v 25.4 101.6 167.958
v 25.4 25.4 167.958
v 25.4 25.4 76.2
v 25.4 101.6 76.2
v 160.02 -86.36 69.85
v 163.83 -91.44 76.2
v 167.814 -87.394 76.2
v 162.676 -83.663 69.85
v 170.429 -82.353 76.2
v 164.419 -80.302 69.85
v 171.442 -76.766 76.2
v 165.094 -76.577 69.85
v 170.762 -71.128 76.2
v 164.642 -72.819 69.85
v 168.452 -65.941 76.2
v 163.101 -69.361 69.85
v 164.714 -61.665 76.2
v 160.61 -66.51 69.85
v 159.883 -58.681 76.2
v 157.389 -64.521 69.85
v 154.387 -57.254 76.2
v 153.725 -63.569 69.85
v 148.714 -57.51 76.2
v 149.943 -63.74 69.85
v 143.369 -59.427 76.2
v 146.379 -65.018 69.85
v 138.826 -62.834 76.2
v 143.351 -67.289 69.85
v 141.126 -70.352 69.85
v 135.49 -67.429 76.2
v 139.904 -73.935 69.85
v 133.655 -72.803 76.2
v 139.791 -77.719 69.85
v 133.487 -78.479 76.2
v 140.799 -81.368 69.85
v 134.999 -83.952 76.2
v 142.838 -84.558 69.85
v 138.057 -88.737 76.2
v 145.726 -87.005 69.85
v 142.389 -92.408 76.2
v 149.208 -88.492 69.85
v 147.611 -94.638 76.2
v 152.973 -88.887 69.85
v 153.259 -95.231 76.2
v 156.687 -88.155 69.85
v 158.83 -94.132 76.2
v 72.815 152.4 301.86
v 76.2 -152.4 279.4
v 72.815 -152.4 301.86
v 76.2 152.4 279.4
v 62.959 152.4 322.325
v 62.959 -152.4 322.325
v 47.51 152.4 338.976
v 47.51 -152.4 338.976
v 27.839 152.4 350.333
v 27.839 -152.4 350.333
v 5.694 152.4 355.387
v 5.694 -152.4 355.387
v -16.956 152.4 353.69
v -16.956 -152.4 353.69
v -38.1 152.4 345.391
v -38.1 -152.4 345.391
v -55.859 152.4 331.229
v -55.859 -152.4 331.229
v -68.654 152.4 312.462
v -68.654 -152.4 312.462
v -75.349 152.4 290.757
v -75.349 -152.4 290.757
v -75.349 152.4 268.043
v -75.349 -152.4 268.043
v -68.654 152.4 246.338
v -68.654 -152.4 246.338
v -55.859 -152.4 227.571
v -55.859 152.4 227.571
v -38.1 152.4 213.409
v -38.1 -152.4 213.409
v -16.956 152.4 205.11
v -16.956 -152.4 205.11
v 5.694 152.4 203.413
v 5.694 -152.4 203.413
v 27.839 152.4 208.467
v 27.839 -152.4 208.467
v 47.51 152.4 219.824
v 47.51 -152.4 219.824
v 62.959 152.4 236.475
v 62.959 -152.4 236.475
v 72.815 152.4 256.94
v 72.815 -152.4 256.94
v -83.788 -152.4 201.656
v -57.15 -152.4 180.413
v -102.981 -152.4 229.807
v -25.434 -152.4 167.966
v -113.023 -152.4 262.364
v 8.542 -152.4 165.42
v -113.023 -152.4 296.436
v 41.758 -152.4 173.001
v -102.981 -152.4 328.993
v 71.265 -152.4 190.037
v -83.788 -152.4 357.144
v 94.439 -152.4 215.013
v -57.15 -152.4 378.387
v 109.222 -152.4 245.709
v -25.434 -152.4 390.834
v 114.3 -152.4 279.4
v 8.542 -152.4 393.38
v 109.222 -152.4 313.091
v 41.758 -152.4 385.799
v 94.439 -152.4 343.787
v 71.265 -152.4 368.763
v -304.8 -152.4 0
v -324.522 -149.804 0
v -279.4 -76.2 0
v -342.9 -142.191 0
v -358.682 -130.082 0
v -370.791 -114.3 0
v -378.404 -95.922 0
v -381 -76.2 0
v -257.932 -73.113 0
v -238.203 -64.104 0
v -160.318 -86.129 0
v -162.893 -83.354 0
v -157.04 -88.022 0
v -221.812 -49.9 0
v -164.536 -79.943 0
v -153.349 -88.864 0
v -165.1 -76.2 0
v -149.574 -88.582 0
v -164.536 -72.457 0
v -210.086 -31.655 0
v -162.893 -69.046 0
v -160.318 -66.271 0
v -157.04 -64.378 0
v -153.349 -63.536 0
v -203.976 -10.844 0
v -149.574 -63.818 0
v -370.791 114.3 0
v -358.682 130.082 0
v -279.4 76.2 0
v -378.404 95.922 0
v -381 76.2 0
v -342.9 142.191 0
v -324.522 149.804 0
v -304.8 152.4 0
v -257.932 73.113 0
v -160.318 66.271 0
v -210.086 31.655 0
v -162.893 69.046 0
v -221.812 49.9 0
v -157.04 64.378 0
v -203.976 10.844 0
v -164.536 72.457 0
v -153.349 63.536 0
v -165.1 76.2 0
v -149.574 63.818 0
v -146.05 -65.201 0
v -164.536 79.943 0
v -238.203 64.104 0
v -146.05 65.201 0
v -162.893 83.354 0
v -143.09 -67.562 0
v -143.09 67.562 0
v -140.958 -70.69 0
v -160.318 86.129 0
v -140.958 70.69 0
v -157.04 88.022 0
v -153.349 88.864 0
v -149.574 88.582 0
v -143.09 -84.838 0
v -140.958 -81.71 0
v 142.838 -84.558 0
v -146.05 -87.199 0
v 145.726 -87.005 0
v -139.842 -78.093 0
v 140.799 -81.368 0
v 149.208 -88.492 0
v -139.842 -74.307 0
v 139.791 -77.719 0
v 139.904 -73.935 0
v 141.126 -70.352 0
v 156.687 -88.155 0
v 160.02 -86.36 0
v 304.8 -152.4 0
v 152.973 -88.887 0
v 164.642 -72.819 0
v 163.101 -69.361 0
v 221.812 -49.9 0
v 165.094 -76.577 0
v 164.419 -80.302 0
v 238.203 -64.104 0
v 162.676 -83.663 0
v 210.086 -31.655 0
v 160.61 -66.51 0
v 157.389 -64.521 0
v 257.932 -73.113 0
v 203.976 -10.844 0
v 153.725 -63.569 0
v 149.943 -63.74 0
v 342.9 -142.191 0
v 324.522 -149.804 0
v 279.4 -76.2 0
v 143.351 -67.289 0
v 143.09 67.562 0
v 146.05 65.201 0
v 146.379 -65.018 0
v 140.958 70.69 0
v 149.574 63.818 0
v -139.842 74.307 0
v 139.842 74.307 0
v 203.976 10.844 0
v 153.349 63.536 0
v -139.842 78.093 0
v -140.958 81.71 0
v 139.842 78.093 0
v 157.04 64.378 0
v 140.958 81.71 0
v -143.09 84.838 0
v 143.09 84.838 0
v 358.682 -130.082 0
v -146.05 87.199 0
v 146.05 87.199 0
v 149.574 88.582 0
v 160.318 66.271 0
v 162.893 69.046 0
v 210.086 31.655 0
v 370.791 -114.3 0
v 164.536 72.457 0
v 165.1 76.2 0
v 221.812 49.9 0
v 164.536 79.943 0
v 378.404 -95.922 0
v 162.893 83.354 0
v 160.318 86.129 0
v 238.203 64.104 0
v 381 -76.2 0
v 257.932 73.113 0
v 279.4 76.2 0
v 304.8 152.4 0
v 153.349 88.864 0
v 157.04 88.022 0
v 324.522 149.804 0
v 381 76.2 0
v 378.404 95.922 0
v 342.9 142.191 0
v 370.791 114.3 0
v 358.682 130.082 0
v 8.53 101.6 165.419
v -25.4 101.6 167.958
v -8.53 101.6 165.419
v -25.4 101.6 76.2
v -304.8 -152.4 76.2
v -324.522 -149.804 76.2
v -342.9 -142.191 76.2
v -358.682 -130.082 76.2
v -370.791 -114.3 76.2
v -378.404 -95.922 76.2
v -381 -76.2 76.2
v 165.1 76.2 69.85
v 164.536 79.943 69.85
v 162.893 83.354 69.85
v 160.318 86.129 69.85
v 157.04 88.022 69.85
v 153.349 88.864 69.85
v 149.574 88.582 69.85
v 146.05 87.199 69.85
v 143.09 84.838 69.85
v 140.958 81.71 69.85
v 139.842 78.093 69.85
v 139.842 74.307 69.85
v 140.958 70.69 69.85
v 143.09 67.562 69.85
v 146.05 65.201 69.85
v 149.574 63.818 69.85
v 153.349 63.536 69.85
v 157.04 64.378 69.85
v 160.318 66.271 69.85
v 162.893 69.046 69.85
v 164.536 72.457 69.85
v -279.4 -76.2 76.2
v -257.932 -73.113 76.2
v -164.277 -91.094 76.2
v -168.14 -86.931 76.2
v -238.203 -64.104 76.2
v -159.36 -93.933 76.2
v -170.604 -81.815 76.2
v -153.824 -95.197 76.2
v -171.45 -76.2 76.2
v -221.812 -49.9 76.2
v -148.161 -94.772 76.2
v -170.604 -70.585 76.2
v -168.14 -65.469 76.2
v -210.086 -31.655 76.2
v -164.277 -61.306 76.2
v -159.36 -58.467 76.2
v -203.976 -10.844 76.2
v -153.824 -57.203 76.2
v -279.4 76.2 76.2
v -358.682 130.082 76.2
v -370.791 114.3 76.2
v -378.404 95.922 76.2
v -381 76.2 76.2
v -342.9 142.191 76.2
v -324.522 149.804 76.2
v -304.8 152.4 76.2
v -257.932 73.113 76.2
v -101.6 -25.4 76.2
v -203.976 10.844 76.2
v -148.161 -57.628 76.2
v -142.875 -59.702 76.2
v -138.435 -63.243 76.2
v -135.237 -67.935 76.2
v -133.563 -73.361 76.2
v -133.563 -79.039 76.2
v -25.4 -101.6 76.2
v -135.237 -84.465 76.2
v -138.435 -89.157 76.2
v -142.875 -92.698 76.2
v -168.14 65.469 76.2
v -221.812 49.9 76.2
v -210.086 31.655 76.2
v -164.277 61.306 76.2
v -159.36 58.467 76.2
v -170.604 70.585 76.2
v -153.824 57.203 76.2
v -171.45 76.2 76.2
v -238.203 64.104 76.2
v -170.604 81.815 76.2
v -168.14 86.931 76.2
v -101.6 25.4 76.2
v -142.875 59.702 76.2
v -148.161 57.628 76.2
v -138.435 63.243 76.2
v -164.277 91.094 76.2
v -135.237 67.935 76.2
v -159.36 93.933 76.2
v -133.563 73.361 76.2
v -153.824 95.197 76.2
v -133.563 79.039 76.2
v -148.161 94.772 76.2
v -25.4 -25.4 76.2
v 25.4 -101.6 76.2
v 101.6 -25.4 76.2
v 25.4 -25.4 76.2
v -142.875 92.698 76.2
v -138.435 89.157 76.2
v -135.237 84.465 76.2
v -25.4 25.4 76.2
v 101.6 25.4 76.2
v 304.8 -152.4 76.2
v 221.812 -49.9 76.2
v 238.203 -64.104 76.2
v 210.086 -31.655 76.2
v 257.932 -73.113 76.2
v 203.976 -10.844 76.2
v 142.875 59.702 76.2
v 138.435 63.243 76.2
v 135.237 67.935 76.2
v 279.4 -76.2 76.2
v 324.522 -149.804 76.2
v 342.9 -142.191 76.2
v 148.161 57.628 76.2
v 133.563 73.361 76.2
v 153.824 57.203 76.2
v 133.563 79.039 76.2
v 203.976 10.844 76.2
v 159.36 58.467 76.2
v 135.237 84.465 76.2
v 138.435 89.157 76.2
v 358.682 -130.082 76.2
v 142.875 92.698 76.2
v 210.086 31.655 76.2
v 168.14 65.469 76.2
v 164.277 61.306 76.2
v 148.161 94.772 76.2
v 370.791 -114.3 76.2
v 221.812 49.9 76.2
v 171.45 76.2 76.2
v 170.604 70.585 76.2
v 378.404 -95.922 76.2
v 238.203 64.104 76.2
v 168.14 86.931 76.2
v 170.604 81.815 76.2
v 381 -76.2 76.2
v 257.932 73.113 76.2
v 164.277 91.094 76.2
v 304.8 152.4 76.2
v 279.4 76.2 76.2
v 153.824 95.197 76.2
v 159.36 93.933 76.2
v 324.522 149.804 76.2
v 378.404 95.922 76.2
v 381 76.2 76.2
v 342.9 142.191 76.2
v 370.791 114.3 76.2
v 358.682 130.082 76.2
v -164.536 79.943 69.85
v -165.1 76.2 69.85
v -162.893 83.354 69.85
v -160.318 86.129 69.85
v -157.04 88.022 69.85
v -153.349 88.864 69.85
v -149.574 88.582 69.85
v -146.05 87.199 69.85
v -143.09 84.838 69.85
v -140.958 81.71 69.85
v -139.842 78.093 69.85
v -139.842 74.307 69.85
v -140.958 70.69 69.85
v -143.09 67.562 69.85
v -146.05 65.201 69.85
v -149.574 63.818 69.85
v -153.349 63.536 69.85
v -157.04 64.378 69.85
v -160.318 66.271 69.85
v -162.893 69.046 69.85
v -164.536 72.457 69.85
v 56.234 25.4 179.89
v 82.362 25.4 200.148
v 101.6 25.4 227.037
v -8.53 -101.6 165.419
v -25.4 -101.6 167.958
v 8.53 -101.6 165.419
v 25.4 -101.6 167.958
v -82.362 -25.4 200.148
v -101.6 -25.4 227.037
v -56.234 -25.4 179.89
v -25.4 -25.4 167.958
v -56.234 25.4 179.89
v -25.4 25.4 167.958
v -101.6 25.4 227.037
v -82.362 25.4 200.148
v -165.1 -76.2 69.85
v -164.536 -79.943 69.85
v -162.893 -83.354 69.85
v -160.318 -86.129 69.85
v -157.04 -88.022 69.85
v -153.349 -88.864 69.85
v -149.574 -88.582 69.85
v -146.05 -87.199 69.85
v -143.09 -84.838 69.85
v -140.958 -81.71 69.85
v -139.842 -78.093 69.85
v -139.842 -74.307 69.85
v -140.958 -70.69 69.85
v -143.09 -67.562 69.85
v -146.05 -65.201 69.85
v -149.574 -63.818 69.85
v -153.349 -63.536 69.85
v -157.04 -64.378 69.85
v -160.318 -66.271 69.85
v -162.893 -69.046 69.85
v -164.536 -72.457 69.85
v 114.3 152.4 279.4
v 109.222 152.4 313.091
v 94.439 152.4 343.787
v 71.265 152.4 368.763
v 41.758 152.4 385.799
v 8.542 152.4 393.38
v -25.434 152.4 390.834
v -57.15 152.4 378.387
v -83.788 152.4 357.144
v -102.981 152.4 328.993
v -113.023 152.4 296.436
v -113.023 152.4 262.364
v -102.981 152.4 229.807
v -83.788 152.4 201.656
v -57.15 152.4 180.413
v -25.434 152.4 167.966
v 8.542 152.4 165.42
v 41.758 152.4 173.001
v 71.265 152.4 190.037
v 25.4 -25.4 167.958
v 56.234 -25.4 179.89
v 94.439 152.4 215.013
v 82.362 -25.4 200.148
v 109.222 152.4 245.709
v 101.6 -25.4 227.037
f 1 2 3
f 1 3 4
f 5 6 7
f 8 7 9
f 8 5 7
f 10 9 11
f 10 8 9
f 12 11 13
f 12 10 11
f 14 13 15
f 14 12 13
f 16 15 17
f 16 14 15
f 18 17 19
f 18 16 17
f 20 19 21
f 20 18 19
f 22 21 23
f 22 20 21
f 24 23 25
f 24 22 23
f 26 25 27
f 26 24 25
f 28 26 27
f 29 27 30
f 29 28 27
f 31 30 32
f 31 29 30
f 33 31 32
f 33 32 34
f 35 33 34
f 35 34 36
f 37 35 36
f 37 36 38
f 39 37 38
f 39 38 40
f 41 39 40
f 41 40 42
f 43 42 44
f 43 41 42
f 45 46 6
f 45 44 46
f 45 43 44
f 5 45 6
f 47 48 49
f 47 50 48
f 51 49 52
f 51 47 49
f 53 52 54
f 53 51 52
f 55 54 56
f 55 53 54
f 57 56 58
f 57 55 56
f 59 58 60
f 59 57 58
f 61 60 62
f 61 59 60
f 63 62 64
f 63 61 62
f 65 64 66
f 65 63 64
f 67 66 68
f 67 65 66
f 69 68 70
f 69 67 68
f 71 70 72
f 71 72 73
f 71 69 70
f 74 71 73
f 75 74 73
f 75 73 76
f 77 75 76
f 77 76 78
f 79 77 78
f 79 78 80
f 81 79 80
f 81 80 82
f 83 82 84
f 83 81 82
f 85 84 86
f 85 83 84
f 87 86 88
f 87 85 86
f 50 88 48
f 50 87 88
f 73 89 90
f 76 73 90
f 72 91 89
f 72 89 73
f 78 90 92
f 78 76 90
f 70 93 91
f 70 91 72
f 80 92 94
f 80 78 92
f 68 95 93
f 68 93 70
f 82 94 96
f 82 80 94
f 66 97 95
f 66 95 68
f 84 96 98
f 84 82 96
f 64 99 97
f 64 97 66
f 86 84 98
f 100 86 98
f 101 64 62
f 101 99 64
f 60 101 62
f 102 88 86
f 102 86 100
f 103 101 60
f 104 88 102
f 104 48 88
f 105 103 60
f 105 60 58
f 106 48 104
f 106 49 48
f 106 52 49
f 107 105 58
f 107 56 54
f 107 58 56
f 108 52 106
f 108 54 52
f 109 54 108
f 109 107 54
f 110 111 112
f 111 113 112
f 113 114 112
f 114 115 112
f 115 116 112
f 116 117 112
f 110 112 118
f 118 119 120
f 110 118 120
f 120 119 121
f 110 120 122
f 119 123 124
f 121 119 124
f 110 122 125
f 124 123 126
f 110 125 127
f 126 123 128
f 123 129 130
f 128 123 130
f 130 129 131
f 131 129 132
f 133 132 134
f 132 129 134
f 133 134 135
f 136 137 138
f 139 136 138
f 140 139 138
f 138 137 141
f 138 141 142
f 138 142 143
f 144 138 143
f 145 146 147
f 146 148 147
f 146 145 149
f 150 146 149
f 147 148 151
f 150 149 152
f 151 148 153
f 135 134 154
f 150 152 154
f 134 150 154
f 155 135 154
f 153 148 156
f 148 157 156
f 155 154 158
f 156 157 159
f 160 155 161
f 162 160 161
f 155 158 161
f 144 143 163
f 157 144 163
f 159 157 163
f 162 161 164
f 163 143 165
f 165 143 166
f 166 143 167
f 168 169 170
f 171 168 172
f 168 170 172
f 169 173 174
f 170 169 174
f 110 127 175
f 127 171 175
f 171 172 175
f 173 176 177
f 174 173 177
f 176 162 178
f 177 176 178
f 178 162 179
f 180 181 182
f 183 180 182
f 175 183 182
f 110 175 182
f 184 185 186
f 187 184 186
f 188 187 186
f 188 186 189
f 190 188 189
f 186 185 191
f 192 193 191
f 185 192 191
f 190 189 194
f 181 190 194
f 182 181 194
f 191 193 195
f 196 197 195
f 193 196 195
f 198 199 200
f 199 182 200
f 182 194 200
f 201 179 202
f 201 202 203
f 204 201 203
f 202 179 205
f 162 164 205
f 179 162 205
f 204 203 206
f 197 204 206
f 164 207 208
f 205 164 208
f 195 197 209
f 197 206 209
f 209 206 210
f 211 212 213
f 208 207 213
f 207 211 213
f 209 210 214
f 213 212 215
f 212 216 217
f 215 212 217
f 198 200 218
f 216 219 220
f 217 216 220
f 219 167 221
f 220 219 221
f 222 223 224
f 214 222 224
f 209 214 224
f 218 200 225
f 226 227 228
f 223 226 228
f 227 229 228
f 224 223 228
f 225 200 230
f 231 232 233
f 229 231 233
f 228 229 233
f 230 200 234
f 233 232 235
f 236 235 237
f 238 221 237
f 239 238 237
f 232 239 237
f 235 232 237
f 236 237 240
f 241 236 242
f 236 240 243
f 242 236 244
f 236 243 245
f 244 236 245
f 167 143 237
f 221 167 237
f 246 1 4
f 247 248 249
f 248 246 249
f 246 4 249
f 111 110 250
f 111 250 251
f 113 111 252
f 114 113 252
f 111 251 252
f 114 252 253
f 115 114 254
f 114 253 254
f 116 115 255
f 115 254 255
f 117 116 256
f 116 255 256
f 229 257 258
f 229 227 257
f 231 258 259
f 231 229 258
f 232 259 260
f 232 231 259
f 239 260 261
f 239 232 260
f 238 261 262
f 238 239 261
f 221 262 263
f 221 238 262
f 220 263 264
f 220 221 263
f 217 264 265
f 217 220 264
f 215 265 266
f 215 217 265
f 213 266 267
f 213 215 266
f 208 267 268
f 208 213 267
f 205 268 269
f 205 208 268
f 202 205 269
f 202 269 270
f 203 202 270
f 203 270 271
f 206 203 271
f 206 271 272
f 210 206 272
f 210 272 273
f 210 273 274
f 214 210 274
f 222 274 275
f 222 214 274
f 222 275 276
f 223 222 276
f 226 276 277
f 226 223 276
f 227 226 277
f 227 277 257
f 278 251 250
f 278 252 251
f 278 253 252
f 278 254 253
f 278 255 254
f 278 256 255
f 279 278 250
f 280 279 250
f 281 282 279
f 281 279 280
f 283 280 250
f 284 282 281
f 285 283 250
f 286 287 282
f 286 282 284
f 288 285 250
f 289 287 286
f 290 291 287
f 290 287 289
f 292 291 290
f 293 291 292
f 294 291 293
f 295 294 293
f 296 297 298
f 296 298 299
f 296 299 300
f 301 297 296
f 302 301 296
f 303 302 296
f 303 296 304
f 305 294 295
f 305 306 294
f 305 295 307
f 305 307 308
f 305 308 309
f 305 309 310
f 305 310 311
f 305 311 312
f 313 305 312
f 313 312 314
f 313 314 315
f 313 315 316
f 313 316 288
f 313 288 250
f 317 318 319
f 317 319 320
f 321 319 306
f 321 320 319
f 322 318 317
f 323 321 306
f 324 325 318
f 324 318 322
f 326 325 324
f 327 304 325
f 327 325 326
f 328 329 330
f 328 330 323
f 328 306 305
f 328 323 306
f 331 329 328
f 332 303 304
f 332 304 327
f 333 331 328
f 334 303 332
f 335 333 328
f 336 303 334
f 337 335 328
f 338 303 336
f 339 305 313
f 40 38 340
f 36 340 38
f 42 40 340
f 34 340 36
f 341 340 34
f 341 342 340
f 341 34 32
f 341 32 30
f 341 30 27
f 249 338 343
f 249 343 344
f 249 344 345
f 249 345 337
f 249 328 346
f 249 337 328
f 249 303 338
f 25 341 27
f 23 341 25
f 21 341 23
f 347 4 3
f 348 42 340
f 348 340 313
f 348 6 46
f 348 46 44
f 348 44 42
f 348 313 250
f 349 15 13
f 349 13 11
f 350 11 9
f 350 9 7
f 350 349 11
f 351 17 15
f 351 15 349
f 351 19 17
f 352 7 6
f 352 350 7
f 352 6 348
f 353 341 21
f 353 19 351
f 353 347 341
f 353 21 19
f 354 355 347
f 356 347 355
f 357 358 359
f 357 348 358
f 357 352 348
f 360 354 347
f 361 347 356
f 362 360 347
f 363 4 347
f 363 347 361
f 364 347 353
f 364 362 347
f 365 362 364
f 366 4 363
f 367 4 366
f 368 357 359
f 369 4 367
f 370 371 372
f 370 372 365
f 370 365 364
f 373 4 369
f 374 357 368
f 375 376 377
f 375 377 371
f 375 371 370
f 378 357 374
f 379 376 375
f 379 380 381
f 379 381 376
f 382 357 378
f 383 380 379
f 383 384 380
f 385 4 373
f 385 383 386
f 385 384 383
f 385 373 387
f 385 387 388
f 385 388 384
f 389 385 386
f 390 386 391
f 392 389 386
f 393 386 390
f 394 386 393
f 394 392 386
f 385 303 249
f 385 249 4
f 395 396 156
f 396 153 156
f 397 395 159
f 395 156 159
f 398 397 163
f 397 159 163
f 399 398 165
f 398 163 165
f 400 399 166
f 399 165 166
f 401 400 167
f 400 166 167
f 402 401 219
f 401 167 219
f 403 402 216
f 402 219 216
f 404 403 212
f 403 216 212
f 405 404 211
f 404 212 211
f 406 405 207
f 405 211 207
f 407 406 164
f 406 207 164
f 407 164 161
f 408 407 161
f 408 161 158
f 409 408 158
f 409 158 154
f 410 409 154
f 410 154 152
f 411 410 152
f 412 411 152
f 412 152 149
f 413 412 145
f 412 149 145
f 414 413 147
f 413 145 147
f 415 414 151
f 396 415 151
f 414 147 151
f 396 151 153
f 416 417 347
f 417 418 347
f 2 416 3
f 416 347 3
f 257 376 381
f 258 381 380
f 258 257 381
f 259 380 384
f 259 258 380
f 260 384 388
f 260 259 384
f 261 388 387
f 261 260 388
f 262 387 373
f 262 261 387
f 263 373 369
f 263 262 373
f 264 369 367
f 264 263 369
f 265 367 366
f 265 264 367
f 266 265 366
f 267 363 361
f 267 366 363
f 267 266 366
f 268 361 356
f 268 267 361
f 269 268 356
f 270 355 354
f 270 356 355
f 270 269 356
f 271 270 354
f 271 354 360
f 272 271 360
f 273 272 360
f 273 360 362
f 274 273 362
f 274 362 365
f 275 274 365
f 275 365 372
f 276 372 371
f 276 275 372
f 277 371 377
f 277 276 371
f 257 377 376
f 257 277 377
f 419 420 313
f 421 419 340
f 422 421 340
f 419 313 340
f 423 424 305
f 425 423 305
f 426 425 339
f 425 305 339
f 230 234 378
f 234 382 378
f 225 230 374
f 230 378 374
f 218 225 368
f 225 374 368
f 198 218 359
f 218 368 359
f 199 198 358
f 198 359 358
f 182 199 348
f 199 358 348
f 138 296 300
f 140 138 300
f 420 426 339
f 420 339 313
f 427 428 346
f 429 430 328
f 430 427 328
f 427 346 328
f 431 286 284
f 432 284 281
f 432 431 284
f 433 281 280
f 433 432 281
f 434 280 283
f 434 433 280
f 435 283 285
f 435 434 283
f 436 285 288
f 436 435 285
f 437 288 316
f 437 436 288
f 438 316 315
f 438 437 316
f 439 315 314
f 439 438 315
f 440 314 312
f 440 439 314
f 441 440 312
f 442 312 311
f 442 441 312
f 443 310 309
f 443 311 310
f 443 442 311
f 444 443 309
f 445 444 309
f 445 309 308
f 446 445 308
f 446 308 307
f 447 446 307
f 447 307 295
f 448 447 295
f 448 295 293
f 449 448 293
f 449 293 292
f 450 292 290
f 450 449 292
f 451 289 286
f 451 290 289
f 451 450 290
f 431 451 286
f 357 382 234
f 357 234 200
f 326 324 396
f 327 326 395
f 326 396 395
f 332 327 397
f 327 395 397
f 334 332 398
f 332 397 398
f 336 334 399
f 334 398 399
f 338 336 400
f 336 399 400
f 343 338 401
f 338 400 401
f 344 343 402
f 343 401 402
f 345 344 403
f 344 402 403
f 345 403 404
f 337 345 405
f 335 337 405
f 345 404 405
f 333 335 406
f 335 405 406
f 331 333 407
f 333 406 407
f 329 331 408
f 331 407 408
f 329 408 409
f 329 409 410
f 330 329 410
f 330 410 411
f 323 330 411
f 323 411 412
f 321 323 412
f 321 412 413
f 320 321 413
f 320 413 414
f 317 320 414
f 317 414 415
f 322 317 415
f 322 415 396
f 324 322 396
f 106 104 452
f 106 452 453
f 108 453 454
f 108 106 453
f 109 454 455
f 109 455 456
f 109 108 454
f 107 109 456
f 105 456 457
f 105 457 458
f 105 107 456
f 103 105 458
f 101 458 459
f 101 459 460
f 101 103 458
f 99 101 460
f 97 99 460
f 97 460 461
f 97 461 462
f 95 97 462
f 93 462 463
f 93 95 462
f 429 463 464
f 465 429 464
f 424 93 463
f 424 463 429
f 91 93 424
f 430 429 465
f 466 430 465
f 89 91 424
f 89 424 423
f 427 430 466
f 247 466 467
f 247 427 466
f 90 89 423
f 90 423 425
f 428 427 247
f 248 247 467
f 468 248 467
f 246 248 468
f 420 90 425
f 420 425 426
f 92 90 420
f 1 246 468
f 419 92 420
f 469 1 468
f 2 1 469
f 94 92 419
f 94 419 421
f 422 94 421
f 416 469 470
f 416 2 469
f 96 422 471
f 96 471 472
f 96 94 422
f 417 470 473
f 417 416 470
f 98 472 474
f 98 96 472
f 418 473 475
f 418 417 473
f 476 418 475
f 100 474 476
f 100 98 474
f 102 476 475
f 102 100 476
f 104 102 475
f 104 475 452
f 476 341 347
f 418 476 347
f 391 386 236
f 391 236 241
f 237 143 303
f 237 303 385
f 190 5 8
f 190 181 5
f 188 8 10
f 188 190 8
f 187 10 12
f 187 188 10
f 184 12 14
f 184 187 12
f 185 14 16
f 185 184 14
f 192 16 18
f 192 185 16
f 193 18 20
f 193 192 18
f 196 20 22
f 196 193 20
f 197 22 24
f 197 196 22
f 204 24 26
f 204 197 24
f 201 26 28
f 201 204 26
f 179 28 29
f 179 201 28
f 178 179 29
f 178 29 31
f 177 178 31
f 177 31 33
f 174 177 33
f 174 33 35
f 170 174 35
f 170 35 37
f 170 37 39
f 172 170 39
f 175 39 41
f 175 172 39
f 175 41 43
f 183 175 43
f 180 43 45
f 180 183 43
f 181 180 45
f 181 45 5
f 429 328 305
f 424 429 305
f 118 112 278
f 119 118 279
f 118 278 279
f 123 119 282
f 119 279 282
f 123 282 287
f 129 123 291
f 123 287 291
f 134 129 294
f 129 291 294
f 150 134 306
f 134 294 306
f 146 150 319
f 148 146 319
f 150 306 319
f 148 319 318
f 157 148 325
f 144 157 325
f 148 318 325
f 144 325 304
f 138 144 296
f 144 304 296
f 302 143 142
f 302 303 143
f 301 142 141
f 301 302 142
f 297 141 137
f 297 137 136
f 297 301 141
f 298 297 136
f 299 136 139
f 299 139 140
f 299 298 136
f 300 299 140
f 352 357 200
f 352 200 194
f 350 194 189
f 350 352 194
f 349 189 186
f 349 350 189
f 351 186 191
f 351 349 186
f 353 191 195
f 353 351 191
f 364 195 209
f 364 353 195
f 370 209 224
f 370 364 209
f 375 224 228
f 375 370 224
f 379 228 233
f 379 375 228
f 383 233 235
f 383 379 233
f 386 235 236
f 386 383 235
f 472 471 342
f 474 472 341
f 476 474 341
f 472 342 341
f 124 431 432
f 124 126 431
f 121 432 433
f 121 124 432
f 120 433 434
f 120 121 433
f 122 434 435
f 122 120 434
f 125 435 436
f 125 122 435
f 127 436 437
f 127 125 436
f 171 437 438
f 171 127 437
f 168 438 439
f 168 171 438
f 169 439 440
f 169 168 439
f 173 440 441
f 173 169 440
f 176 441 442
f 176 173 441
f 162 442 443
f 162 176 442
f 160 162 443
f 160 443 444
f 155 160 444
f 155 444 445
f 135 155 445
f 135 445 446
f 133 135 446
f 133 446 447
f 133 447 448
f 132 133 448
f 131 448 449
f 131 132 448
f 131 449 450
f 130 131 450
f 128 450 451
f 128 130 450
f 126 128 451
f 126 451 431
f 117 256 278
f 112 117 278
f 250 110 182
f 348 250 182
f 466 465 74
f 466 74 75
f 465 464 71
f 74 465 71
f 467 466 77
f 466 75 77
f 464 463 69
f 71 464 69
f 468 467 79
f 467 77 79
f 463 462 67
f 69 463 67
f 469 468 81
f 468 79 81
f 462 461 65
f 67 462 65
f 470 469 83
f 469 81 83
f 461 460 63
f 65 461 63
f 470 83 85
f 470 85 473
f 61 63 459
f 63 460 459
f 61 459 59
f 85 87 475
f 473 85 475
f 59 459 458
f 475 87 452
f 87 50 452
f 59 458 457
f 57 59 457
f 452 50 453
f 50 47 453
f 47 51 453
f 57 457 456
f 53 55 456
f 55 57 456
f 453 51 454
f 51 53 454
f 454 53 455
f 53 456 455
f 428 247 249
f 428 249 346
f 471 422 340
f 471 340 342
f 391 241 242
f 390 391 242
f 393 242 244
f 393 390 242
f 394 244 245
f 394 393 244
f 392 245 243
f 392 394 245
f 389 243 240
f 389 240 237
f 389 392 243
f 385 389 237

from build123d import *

# Parameters (mm, degrees)
F0_W            = 762
F0_H            = 304.8
F1_DEPTH        = 76.2
F3_DEPTH        = 203.2
F4_R            = 114.3
F4_R_2          = 76.2
F5_DEPTH        = 152.4
F6_DEPTH        = 152.4
F8_R            = 76.2
F10_DEPTH       = 76.201
F11_D           = 25.4
F11_CSINK_D     = 38.1
F11_CSINK_ANGLE = 90


# Not quite as in the source:
# - a pattern or mirror of a feature is missing from the dataset's text; its kind, count and spacing are read off the source's solid


with BuildPart() as f1:
    # F0 (on Top) → F1 (new body)
    with BuildSketch(Plane.XY):
        Rectangle(F0_W, F0_H)
    extrude(amount=F1_DEPTH)

    # F2 (on face) → F3 (join)
    with BuildSketch(Plane.XY.offset(76.2)):
        Polygon((101.6, -25.4), (101.6, 25.4), (25.4, 25.4), (25.4, 101.6), (-25.4, 101.6), (-25.4, 25.4), (-101.6, 25.4), (-101.6, -25.4), (-25.4, -25.4), (-25.4, -101.6), (25.4, -101.6), (25.4, -25.4), align=None)
    extrude(amount=F3_DEPTH)

    # F4 (on Front) → F5 (join, symmetric)
    with BuildSketch(Plane.XZ):
        with Locations((0, 279.4)):
            Circle(F4_R)
        with Locations((0, 279.4)):
            Circle(F4_R_2, mode=Mode.SUBTRACT)
    extrude(amount=F5_DEPTH, both=True)

    # F4 (on Front) → F6 (cut, symmetric)
    with BuildSketch(Plane.XZ):
        with Locations((0, 279.4)):
            Circle(F4_R_2)
    extrude(amount=F6_DEPTH, both=True, mode=Mode.SUBTRACT)

    # F8
    f8_edges = [f1.edges().sort_by_distance(p)[0] for p in [
        (381, 152.4, 38.1),
        (-381, 152.4, 38.1),
        (381, -152.4, 38.1),
        (-381, -152.4, 38.1),
    ]]
    fillet(f8_edges, radius=F8_R)

    # F9 (on face) → F10 (cut, through all)
    with BuildSketch(Plane.XY.offset(76.2)):
        with BuildLine():
            Line((-381, -76.2), (-279.4, -76.2))
            ThreePointArc((-279.4, -76.2), (-203.2, 0), (-279.4, 76.2))
            Line((-279.4, 76.2), (-381, 76.2))
            Line((-381, 76.2), (-381, -76.2))
        make_face()
    f10 = extrude(amount=-F10_DEPTH, mode=Mode.SUBTRACT)

    # F10_copies: F10 across plane
    add(f10.mirror(Plane(origin=(0, 0, 0), x_dir=(0, 0, 1), z_dir=(1, 0, 0))), mode=Mode.SUBTRACT)

    # F11 (through all)
    with Locations(Plane.XY.offset(76.2)):
        with Locations((-152.4, 76.2)):
            f11 = CounterSinkHole(F11_D / 2, F11_CSINK_D / 2, counter_sink_angle=F11_CSINK_ANGLE)

    # F11_copies: F11 across plane
    add(f11.mirror(Plane(origin=(0, 0, 0), x_dir=(0, 0, -1), z_dir=(0, -1, 0))), mode=Mode.SUBTRACT)

    # F11_copies1: F11 across plane
    add(f11.mirror(Plane(origin=(0, 0, 0), x_dir=(0, 0, 1), z_dir=(1, 0, 0))), mode=Mode.SUBTRACT)

    # F11_copies2: F11 across plane
    add(f11.mirror(Plane(origin=(0, 0, 0), x_dir=(0.4472135955, 0.894427191, 0), z_dir=(0.894427191, -0.4472135955, 0))), mode=Mode.SUBTRACT)


solid = f1.part
